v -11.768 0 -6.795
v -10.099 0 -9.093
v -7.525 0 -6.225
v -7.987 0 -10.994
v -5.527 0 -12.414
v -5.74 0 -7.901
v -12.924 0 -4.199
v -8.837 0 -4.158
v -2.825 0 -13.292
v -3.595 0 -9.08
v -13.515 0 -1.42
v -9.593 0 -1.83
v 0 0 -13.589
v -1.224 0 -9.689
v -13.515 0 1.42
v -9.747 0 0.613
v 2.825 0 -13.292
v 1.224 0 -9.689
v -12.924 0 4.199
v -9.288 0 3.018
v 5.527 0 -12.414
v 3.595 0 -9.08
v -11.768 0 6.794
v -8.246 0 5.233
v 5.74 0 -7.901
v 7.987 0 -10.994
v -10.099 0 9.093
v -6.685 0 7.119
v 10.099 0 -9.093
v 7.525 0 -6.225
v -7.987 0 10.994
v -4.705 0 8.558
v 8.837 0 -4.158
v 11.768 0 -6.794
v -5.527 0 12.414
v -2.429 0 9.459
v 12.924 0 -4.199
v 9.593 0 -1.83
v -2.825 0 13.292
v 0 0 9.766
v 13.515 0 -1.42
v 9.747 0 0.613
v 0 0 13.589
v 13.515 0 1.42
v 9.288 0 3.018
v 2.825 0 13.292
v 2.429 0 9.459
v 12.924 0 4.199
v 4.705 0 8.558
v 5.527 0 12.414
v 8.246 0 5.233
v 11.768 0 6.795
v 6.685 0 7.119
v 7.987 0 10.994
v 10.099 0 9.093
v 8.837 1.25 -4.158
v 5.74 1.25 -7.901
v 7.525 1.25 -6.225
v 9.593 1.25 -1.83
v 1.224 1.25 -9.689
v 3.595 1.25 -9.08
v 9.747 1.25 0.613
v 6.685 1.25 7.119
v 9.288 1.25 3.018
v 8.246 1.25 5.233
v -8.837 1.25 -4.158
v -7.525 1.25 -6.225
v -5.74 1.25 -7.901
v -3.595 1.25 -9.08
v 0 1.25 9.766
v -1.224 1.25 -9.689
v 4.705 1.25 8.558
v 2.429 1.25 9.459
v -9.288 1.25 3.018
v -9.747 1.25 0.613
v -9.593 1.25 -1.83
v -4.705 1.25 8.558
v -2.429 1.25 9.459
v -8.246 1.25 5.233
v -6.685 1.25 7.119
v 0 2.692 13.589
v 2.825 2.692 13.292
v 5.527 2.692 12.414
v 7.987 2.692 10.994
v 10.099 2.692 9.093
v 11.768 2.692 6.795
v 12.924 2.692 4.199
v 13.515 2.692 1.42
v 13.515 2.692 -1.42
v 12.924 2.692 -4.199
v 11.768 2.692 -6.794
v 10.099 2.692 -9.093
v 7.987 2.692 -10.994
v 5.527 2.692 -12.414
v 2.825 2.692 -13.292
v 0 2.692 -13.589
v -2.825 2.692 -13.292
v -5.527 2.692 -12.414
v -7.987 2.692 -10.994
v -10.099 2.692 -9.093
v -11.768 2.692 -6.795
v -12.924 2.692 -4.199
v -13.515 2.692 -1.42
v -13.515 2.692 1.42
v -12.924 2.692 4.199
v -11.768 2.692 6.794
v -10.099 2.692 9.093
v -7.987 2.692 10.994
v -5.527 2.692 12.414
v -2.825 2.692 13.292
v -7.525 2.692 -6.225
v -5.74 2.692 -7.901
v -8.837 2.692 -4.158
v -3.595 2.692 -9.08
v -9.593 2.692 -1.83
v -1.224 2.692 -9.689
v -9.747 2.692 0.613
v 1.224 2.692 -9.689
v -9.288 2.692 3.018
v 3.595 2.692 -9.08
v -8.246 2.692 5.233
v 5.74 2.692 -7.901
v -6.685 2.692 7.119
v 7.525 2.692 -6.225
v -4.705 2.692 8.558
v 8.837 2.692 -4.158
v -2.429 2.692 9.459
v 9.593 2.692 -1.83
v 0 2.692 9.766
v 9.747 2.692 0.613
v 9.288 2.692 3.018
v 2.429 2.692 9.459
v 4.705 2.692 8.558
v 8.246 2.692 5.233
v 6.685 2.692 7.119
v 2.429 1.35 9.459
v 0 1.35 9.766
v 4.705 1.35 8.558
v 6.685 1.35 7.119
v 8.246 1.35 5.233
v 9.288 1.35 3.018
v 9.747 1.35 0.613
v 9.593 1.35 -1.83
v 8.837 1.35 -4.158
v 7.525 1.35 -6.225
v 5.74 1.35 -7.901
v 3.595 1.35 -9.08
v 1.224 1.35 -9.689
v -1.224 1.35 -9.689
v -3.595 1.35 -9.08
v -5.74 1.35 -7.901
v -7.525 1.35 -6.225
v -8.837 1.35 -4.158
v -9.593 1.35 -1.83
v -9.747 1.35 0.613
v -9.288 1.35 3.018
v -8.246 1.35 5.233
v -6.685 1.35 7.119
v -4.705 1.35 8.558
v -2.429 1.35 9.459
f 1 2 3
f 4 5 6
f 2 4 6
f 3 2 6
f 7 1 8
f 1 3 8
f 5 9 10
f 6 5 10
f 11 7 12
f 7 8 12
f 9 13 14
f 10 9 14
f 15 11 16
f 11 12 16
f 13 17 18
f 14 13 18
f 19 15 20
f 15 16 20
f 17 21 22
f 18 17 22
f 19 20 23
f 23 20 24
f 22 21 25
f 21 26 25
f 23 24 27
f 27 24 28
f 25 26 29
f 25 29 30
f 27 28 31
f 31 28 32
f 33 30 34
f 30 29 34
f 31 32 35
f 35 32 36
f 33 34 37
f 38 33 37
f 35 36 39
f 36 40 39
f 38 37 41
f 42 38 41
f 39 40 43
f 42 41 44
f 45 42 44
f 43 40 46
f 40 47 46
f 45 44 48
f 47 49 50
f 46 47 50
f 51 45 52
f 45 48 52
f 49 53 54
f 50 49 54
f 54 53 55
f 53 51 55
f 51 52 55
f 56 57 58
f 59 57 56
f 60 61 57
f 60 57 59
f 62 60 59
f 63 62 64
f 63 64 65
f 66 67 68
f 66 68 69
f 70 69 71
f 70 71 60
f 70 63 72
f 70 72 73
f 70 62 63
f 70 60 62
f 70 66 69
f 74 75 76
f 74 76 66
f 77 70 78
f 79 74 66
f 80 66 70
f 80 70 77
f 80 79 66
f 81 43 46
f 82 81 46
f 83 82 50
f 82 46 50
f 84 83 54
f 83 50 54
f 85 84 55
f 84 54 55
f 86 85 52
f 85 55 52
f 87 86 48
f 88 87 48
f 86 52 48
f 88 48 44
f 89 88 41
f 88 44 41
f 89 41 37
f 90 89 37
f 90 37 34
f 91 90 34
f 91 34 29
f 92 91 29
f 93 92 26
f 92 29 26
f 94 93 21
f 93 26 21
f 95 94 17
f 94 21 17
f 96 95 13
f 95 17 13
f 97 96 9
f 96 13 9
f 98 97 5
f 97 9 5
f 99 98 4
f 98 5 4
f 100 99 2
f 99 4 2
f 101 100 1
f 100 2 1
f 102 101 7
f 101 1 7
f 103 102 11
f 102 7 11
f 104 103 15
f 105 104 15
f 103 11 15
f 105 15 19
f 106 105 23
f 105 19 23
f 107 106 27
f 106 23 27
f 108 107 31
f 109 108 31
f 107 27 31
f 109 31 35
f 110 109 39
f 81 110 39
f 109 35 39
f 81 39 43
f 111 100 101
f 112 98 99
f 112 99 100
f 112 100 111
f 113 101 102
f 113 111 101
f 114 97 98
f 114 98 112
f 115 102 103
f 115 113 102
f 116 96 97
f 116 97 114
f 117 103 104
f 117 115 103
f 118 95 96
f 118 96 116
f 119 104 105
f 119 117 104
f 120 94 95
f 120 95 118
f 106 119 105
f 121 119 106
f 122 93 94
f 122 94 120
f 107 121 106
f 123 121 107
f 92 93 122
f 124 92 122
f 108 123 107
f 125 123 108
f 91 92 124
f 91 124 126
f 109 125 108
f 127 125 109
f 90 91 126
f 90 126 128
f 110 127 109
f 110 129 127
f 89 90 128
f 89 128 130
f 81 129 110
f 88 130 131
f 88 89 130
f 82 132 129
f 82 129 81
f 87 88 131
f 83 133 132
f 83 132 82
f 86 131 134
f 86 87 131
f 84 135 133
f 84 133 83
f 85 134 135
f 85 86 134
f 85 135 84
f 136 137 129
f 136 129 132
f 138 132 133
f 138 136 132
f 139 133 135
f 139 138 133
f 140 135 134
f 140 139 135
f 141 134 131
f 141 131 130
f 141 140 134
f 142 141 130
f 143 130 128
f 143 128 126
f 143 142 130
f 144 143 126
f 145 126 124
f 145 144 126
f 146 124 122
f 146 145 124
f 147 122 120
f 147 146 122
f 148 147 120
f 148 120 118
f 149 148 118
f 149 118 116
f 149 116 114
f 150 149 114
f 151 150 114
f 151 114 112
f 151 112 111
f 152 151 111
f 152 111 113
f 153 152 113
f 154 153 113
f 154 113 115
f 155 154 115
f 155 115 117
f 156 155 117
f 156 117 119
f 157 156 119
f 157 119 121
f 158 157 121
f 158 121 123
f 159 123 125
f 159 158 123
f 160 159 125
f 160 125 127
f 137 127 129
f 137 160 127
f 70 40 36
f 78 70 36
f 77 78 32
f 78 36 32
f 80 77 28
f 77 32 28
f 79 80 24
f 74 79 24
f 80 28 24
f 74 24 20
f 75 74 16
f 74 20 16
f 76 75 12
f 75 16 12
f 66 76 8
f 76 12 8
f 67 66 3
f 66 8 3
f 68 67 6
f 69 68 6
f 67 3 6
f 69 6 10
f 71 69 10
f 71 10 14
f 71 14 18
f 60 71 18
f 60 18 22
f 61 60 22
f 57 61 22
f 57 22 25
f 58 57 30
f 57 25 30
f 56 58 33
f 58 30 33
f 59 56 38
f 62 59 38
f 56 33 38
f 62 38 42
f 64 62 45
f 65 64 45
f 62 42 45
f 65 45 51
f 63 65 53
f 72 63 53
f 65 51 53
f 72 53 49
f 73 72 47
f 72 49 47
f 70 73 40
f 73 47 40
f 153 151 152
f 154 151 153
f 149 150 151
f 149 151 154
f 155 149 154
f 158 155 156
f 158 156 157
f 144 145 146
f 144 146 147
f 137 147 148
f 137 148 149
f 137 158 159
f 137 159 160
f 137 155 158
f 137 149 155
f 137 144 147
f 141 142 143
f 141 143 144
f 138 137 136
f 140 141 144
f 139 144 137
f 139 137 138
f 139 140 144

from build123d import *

# Parameters (mm, degrees)
SKETCH1_R           = 13.589
SKETCH1_R_2         = 9.7663
BOSS_EXTRUDE1_DEPTH = 2.6924
SKETCH3_R           = 9.7663
BOSS_EXTRUDE2_DEPTH = 1.35
SKETCH4_R           = 9.7663
CUT_EXTRUDE1_DEPTH  = 1.25


with BuildPart() as part:
    # Sketch1 → Boss-Extrude1 (new body)
    with BuildSketch(Plane(origin=(0, 0, 0), x_dir=(1, 0, 0), z_dir=(0, 1, 0))):
        with Locations(Location((0, 0, 0), (0, 0, 270))):
            Circle(SKETCH1_R)
        with Locations(Location((0, 0, 0), (0, 0, 270))):
            Circle(SKETCH1_R_2, mode=Mode.SUBTRACT)
    extrude(amount=BOSS_EXTRUDE1_DEPTH)

    # Sketch3 → Boss-Extrude2 (add)
    with BuildSketch(Plane(origin=(0, 0, 0), x_dir=(1, 0, 0), z_dir=(0, 1, 0))):
        with Locations(Location((0, 0, 0), (0, 0, 270))):
            Circle(SKETCH3_R)
    extrude(amount=BOSS_EXTRUDE2_DEPTH)

    # Sketch4 → Cut-Extrude1 (cut)
    with BuildSketch(Plane.XZ):
        with Locations(Location((0, 0, 0), (0, 0, 90))):
            Circle(SKETCH4_R)
    extrude(amount=-CUT_EXTRUDE1_DEPTH, mode=Mode.SUBTRACT)


solid = part.part
